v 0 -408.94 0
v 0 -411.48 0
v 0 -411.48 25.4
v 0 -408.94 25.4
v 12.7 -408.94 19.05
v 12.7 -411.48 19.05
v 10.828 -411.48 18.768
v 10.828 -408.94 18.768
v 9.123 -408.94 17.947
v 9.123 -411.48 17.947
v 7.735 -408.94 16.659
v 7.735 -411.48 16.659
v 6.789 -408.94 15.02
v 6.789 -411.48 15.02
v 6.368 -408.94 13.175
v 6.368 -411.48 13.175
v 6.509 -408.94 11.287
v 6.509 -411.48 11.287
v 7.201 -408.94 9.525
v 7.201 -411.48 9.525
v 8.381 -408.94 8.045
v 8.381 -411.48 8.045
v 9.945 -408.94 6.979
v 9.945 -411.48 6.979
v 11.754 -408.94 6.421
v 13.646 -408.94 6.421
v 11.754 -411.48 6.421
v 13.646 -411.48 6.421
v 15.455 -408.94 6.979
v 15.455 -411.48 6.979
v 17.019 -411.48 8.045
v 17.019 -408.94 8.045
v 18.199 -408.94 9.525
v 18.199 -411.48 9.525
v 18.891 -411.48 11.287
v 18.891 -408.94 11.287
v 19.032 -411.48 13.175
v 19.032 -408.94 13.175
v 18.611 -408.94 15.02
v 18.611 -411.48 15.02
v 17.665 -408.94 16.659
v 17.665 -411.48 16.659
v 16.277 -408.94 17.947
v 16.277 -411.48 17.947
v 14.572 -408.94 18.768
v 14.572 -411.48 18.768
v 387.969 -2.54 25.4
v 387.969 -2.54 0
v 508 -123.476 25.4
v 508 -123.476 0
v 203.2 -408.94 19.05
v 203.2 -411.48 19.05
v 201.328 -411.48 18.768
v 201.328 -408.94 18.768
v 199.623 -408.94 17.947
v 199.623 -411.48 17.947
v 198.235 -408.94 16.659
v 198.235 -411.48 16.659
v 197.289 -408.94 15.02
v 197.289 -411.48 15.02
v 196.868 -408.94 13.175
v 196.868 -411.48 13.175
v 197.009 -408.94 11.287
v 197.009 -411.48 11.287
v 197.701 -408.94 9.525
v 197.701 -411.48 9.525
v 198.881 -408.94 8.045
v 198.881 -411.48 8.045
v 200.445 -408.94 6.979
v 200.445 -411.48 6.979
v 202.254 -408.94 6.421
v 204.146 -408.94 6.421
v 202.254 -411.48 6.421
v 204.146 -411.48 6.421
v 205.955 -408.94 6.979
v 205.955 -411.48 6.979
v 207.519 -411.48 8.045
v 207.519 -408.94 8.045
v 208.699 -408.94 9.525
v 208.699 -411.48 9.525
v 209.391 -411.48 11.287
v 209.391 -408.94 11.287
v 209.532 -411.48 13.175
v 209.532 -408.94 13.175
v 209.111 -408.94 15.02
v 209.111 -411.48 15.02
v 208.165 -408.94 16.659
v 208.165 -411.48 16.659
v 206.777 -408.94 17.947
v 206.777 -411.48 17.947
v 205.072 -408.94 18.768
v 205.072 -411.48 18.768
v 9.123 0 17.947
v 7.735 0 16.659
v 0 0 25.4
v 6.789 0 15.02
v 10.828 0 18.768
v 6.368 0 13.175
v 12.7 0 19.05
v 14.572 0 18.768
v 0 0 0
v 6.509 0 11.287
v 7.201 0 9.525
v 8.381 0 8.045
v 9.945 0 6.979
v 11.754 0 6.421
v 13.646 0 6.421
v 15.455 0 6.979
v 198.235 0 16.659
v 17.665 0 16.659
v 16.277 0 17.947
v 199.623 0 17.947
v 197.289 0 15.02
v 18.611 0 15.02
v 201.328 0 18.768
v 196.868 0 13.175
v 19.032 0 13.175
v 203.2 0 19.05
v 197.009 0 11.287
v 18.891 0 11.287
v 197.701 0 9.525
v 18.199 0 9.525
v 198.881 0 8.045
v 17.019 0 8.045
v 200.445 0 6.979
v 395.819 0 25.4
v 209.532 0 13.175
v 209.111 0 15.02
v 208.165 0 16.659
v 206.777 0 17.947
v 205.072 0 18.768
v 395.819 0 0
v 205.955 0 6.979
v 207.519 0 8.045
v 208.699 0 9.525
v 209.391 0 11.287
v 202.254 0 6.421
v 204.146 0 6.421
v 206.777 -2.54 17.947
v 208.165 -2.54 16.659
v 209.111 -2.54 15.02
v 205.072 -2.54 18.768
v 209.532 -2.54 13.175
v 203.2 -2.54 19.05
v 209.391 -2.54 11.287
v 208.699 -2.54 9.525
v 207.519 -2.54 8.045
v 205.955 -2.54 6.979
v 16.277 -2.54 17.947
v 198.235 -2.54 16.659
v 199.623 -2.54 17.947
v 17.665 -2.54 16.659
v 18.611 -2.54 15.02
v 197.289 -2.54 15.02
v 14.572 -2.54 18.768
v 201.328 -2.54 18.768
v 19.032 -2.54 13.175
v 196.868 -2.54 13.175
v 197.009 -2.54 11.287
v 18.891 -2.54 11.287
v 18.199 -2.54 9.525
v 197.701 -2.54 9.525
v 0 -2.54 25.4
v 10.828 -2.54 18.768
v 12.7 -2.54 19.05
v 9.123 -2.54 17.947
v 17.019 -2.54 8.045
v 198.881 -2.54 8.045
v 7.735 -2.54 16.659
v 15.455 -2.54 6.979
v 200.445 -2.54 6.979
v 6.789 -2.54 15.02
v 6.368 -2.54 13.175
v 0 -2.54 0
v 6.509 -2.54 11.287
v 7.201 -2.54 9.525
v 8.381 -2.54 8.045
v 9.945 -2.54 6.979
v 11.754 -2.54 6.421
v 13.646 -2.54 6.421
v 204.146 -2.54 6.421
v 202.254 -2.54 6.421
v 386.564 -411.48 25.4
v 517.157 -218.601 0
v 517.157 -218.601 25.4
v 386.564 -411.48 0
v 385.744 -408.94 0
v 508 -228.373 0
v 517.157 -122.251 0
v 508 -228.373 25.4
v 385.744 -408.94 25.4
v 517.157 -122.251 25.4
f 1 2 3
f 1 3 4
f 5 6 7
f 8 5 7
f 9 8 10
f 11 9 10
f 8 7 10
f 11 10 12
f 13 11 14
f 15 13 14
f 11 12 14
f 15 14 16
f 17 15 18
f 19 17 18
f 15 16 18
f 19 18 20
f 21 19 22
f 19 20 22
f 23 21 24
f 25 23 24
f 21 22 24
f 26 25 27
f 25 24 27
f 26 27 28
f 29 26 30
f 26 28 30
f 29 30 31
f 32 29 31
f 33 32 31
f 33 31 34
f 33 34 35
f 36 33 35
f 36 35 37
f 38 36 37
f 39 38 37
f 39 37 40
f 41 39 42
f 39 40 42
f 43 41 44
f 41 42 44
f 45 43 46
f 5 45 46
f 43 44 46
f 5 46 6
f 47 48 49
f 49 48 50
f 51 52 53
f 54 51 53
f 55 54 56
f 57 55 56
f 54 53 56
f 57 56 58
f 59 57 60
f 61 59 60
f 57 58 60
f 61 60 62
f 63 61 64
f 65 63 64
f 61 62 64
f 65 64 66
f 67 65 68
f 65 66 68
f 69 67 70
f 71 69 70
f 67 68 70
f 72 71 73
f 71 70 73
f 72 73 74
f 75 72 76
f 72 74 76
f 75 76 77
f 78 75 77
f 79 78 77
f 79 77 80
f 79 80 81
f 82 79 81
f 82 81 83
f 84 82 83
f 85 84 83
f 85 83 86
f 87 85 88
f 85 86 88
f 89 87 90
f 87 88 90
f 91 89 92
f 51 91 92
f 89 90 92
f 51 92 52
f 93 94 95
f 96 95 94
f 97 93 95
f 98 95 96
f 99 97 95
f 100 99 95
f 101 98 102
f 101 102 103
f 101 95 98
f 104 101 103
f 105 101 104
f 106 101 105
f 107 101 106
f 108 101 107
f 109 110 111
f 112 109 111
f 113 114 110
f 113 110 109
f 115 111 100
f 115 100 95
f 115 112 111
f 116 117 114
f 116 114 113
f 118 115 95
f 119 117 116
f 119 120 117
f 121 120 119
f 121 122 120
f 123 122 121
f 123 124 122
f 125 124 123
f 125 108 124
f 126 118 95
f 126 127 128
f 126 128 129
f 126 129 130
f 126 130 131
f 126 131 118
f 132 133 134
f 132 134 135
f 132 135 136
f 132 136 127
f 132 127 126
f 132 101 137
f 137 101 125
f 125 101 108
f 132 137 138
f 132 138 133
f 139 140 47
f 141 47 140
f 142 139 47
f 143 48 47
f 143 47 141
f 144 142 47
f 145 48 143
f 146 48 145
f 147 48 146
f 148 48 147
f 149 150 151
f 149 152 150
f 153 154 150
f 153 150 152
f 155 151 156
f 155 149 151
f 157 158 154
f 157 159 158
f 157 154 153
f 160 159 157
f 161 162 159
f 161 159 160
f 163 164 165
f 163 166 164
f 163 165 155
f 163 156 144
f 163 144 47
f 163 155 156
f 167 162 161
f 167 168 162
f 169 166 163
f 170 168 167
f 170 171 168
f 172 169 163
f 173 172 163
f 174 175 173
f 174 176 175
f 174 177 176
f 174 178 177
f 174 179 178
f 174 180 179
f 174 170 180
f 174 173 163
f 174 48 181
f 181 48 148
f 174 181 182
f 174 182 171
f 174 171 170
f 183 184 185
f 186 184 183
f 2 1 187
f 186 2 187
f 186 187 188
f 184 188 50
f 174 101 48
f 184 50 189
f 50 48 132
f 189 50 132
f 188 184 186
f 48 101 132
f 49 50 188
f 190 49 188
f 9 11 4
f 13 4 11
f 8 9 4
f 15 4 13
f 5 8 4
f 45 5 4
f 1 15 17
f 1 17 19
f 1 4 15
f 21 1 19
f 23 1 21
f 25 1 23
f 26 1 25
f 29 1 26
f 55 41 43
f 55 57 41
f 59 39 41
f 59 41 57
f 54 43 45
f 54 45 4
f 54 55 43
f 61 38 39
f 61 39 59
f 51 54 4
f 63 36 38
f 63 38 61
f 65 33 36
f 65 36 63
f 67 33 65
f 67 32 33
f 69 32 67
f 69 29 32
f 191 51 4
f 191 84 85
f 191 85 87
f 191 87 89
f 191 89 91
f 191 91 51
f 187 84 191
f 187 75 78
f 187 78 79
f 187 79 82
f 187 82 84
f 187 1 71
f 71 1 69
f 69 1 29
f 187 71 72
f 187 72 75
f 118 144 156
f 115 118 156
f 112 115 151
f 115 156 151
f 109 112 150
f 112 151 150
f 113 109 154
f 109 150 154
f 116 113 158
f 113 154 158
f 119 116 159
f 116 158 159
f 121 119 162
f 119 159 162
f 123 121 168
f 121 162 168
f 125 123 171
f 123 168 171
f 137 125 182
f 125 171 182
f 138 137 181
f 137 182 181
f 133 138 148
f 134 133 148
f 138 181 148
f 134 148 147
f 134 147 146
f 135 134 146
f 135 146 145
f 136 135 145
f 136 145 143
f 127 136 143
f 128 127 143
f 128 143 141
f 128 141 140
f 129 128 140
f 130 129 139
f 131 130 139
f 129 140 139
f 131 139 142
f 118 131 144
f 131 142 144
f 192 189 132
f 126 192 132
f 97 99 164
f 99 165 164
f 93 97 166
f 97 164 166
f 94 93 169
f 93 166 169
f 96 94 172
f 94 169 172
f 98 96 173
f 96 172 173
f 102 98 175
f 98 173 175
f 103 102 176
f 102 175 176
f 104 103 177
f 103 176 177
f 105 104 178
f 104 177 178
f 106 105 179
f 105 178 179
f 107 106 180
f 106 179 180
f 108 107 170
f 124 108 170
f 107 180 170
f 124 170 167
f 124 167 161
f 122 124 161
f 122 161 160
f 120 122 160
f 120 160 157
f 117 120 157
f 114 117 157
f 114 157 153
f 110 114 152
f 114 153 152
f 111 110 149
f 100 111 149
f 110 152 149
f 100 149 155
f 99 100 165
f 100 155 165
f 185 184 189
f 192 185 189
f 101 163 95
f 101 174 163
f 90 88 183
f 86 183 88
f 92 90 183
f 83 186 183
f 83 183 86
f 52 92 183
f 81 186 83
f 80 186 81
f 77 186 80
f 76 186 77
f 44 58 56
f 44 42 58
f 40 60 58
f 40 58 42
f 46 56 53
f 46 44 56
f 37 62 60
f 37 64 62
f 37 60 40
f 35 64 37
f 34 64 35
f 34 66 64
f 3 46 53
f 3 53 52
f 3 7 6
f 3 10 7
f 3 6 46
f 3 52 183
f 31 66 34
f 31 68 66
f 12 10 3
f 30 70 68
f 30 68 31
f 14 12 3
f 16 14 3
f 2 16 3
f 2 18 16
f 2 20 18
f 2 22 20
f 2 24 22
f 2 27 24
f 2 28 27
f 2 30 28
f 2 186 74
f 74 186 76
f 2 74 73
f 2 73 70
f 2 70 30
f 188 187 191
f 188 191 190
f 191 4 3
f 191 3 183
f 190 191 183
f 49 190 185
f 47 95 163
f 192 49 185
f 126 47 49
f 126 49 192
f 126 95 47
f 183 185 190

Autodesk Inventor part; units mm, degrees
ref_plane "YZ Plane" through (0, 0, 0) normal (1, 0, 0) x (0, 1, 0)
ref_plane "XZ Plane" through (0, 0, 0) normal (0, 1, 0) x (-1, 0, 0)
ref_plane "XY Plane" through (0, 0, 0) normal (0, 0, 1) x (1, 0, 0)
sketch "Sketch9" plane through (0, 0, 0) normal (0, 0, 1) x (1, 0, 0)
  line L0 (0, 0) -> (395.8194, 0)
  line L1 (387.9689, -2.54) -> (508, -123.4756)
  line L2 (508, -123.4756) -> (508, -228.3729)
  line L3 (517.1565, -218.6006) -> (386.5644, -411.48)
  line L4 (386.5644, -411.48) -> (0, -411.48)
  line L5 (0, -411.48) -> (0, -408.94)
  line L6 (0, -408.94) -> (385.7441, -408.94)
  line L7 (385.7441, -408.94) -> (508, -228.3729)
  line L8 (517.1565, -218.6006) -> (517.1565, -122.2514)
  line L9 (517.1565, -122.2514) -> (395.8194, 0)
  line L10 (387.9689, -2.54) -> (0, -2.54)
  line L11 (0, -2.54) -> (0, 0)
  dimension "d32" = 508
  dimension "d35" = 406.4
  dimension "d36" = 2.54
  dimension "d37" = 2.54
extrude "Extrusion6" add sketch "Sketch9" along normal blind 25.4
hole "Hole1" at (12.7, 0, 12.7) direction (0, -1, 0) diameter 12.7 end through all
hole "Hole2" at (203.2, 0, 12.7) direction (0, -1, 0) diameter 12.7 end through all
properties part number "4barRoundedBar"
